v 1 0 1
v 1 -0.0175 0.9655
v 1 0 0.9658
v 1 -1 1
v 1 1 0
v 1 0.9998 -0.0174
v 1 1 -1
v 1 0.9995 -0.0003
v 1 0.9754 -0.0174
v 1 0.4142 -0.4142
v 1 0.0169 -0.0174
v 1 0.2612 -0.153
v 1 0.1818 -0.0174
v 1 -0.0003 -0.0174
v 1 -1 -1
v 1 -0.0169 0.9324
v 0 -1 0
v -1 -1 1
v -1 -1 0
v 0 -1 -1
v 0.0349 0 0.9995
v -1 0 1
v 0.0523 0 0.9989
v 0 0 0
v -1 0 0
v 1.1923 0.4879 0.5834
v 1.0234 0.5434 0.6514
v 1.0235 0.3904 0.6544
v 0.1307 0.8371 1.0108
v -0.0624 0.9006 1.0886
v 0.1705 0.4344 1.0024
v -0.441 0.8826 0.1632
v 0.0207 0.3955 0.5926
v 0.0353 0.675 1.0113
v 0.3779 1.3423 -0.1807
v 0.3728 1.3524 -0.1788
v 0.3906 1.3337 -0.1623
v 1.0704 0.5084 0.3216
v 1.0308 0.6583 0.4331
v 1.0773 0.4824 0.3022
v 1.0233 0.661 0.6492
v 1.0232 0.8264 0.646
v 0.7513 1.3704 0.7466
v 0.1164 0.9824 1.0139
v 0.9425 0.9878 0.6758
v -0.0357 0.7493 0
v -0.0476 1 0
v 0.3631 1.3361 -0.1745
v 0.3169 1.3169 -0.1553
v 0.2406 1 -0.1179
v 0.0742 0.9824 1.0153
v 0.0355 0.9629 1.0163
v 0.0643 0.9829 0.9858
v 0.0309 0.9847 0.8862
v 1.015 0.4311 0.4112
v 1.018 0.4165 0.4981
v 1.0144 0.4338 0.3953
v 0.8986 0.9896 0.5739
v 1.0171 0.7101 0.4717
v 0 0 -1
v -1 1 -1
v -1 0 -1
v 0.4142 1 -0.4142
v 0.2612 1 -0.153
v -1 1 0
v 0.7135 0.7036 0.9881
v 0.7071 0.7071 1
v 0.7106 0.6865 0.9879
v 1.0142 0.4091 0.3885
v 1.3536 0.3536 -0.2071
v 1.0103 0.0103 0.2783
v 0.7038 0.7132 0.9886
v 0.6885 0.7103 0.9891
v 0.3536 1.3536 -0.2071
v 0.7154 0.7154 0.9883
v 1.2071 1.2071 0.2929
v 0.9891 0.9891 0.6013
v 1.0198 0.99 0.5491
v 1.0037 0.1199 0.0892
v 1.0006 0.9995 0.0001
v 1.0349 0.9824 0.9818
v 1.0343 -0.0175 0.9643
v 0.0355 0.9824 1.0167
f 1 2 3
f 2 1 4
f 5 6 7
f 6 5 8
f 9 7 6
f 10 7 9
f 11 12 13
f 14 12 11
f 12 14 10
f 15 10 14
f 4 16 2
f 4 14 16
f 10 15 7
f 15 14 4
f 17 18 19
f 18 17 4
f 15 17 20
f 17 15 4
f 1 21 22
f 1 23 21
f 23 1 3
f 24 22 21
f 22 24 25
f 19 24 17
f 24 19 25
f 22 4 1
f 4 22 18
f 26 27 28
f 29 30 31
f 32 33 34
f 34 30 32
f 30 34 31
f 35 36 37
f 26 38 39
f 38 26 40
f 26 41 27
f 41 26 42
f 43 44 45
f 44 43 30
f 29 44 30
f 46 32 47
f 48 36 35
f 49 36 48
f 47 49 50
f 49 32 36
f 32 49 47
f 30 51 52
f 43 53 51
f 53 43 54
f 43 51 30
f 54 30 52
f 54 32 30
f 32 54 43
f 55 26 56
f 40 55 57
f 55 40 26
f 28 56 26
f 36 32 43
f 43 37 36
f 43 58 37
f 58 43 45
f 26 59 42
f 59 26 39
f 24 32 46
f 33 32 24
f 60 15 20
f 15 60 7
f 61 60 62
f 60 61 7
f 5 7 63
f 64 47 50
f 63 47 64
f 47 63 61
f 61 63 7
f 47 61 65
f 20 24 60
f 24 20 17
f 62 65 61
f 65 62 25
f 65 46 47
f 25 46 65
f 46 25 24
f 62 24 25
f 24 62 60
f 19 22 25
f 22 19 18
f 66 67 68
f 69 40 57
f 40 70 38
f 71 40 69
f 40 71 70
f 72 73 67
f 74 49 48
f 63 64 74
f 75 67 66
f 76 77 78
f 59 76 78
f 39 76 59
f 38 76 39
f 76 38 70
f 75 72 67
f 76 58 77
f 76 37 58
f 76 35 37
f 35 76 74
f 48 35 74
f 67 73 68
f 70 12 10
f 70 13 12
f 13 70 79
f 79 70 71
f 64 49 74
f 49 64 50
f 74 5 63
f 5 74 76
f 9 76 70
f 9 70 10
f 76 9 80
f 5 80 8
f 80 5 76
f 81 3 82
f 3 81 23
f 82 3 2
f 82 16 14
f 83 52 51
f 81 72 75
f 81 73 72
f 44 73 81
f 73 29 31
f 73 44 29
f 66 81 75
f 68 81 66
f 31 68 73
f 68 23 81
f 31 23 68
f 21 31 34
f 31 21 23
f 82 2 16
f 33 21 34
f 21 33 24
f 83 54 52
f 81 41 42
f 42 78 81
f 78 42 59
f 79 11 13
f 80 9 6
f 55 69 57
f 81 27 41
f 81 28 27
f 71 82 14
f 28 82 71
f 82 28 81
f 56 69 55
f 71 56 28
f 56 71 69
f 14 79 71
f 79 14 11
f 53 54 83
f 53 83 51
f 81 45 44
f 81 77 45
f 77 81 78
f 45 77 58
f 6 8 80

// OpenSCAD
rotate([90, 0, 0]) cube();
rotate([10, 20, 30]) cube();
rotate(a = [0, 90, 0]) cube();
rotate([180, 0, 0]) cube();
rotate([0, 180, 0]) cube();
rotate([0, 0, 180]) cube();
rotate([90, 90, 90]) cube();
rotate([270, 0, 0]) cube();
rotate([45, 45, 45]) cube();
rotate([1, 2]) cube();
